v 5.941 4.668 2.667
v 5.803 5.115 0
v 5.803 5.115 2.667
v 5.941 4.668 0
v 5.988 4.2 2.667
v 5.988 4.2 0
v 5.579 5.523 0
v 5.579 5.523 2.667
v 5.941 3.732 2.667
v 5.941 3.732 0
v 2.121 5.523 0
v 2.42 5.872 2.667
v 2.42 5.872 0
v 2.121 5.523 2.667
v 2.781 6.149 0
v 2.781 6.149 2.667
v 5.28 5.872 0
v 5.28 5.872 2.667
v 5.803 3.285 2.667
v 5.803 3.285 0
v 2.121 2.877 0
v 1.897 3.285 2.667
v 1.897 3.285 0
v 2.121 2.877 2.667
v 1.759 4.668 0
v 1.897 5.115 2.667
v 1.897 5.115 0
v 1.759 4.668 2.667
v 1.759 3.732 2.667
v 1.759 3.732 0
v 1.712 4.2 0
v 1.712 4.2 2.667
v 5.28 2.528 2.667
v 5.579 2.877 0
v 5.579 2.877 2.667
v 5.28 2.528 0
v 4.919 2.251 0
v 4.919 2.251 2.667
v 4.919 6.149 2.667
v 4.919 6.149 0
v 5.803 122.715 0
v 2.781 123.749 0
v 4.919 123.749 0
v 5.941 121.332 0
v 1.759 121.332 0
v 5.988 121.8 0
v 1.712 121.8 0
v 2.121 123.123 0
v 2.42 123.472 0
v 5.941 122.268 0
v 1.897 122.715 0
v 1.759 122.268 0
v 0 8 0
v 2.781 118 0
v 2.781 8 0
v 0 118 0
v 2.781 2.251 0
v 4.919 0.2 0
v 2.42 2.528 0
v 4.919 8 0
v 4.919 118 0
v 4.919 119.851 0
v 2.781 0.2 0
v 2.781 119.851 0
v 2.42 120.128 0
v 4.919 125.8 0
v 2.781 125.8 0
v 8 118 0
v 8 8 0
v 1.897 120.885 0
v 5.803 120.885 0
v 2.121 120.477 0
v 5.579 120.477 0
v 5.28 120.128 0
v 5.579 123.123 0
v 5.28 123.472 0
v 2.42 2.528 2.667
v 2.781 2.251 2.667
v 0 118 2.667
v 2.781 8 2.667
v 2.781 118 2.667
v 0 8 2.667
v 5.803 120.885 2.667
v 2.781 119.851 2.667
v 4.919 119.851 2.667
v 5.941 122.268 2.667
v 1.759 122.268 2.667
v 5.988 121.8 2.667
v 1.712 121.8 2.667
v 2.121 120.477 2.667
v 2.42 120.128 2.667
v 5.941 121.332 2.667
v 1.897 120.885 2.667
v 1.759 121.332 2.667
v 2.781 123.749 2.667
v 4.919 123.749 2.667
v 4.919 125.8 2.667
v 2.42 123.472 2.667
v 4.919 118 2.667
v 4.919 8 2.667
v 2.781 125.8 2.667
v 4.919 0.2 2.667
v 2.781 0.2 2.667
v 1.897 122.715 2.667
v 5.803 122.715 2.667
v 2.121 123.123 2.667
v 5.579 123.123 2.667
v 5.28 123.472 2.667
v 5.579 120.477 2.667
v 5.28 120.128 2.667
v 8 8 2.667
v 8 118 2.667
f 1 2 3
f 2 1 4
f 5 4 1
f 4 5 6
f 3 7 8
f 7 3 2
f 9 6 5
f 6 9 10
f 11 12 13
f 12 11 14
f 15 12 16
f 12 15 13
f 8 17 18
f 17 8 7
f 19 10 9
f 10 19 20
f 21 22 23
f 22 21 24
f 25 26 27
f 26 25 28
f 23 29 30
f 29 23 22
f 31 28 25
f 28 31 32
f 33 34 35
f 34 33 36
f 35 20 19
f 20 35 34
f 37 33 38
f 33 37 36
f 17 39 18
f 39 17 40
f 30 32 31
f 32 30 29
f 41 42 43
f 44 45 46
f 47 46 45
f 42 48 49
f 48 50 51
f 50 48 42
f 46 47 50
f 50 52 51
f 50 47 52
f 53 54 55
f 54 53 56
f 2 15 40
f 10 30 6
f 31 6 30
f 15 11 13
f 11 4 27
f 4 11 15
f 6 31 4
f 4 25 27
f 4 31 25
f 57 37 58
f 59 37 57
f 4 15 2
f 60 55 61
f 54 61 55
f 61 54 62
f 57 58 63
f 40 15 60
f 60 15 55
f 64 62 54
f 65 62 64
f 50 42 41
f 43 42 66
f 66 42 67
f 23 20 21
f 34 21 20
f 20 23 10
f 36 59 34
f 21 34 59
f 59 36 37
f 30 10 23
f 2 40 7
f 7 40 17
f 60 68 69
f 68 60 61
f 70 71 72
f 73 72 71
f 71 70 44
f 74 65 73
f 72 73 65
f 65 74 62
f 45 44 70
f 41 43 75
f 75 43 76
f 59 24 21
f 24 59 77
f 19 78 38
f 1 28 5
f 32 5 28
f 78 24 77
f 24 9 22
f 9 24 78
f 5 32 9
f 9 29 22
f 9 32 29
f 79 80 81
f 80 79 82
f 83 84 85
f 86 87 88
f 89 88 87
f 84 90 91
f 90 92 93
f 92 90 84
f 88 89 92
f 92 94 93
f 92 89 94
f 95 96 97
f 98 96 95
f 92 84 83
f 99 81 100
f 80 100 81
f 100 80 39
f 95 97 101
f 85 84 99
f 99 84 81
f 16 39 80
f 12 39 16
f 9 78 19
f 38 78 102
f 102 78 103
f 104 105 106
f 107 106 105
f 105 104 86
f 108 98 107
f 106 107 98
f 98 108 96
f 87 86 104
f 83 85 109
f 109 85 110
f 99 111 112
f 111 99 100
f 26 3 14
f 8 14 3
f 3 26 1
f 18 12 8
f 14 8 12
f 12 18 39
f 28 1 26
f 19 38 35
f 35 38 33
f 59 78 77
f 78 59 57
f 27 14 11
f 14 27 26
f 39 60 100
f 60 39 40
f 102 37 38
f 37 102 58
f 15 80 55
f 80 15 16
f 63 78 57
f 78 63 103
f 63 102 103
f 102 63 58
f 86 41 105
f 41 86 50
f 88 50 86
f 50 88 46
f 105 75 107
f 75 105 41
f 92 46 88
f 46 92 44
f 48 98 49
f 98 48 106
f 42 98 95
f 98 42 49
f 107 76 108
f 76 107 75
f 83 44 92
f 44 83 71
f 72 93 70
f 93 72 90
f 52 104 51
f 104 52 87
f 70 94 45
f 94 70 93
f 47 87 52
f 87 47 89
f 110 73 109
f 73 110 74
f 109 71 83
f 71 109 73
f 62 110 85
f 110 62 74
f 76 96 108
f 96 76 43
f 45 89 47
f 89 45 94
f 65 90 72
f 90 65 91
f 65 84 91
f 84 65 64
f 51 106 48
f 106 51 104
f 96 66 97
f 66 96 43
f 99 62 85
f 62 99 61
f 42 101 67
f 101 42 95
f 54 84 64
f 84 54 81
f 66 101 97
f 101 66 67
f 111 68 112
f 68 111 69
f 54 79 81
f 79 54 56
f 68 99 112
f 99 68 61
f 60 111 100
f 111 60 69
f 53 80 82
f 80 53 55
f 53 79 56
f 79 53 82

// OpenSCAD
// file: Spool_mount_for_i3_config.scad
//
//
//Variables

width=8;
length_frame_mount=40;
length_strip=120;
length_axis_support=15;
height=18;

//Liston de enlace
height_clamp=width/3;

//enganche
module anchor(){
	translate([height/2,0,width/2]) rotate([90,0,0]) 
	union(){
		cylinder(r=height/8, h=height_clamp, $fn=30);
		translate([0,0,height_clamp/2])
			cube([height/8,width,height_clamp],center=true);
	}
}
// main file
include<Spool_mount_for_i3_config.scad>

module anchor_axis(){
	union() {
		translate([0,-height_clamp,width])
			cube([width,height_clamp,110]);
		translate([-width/2-0.7,0,0.2]) scale([0.95,1,1]) anchor();
		translate([-width/2-0.7,0,110+width-0.2]) scale([0.95,1,1]) anchor();
	}
}

rotate([270,0,0]) 
anchor_axis();
